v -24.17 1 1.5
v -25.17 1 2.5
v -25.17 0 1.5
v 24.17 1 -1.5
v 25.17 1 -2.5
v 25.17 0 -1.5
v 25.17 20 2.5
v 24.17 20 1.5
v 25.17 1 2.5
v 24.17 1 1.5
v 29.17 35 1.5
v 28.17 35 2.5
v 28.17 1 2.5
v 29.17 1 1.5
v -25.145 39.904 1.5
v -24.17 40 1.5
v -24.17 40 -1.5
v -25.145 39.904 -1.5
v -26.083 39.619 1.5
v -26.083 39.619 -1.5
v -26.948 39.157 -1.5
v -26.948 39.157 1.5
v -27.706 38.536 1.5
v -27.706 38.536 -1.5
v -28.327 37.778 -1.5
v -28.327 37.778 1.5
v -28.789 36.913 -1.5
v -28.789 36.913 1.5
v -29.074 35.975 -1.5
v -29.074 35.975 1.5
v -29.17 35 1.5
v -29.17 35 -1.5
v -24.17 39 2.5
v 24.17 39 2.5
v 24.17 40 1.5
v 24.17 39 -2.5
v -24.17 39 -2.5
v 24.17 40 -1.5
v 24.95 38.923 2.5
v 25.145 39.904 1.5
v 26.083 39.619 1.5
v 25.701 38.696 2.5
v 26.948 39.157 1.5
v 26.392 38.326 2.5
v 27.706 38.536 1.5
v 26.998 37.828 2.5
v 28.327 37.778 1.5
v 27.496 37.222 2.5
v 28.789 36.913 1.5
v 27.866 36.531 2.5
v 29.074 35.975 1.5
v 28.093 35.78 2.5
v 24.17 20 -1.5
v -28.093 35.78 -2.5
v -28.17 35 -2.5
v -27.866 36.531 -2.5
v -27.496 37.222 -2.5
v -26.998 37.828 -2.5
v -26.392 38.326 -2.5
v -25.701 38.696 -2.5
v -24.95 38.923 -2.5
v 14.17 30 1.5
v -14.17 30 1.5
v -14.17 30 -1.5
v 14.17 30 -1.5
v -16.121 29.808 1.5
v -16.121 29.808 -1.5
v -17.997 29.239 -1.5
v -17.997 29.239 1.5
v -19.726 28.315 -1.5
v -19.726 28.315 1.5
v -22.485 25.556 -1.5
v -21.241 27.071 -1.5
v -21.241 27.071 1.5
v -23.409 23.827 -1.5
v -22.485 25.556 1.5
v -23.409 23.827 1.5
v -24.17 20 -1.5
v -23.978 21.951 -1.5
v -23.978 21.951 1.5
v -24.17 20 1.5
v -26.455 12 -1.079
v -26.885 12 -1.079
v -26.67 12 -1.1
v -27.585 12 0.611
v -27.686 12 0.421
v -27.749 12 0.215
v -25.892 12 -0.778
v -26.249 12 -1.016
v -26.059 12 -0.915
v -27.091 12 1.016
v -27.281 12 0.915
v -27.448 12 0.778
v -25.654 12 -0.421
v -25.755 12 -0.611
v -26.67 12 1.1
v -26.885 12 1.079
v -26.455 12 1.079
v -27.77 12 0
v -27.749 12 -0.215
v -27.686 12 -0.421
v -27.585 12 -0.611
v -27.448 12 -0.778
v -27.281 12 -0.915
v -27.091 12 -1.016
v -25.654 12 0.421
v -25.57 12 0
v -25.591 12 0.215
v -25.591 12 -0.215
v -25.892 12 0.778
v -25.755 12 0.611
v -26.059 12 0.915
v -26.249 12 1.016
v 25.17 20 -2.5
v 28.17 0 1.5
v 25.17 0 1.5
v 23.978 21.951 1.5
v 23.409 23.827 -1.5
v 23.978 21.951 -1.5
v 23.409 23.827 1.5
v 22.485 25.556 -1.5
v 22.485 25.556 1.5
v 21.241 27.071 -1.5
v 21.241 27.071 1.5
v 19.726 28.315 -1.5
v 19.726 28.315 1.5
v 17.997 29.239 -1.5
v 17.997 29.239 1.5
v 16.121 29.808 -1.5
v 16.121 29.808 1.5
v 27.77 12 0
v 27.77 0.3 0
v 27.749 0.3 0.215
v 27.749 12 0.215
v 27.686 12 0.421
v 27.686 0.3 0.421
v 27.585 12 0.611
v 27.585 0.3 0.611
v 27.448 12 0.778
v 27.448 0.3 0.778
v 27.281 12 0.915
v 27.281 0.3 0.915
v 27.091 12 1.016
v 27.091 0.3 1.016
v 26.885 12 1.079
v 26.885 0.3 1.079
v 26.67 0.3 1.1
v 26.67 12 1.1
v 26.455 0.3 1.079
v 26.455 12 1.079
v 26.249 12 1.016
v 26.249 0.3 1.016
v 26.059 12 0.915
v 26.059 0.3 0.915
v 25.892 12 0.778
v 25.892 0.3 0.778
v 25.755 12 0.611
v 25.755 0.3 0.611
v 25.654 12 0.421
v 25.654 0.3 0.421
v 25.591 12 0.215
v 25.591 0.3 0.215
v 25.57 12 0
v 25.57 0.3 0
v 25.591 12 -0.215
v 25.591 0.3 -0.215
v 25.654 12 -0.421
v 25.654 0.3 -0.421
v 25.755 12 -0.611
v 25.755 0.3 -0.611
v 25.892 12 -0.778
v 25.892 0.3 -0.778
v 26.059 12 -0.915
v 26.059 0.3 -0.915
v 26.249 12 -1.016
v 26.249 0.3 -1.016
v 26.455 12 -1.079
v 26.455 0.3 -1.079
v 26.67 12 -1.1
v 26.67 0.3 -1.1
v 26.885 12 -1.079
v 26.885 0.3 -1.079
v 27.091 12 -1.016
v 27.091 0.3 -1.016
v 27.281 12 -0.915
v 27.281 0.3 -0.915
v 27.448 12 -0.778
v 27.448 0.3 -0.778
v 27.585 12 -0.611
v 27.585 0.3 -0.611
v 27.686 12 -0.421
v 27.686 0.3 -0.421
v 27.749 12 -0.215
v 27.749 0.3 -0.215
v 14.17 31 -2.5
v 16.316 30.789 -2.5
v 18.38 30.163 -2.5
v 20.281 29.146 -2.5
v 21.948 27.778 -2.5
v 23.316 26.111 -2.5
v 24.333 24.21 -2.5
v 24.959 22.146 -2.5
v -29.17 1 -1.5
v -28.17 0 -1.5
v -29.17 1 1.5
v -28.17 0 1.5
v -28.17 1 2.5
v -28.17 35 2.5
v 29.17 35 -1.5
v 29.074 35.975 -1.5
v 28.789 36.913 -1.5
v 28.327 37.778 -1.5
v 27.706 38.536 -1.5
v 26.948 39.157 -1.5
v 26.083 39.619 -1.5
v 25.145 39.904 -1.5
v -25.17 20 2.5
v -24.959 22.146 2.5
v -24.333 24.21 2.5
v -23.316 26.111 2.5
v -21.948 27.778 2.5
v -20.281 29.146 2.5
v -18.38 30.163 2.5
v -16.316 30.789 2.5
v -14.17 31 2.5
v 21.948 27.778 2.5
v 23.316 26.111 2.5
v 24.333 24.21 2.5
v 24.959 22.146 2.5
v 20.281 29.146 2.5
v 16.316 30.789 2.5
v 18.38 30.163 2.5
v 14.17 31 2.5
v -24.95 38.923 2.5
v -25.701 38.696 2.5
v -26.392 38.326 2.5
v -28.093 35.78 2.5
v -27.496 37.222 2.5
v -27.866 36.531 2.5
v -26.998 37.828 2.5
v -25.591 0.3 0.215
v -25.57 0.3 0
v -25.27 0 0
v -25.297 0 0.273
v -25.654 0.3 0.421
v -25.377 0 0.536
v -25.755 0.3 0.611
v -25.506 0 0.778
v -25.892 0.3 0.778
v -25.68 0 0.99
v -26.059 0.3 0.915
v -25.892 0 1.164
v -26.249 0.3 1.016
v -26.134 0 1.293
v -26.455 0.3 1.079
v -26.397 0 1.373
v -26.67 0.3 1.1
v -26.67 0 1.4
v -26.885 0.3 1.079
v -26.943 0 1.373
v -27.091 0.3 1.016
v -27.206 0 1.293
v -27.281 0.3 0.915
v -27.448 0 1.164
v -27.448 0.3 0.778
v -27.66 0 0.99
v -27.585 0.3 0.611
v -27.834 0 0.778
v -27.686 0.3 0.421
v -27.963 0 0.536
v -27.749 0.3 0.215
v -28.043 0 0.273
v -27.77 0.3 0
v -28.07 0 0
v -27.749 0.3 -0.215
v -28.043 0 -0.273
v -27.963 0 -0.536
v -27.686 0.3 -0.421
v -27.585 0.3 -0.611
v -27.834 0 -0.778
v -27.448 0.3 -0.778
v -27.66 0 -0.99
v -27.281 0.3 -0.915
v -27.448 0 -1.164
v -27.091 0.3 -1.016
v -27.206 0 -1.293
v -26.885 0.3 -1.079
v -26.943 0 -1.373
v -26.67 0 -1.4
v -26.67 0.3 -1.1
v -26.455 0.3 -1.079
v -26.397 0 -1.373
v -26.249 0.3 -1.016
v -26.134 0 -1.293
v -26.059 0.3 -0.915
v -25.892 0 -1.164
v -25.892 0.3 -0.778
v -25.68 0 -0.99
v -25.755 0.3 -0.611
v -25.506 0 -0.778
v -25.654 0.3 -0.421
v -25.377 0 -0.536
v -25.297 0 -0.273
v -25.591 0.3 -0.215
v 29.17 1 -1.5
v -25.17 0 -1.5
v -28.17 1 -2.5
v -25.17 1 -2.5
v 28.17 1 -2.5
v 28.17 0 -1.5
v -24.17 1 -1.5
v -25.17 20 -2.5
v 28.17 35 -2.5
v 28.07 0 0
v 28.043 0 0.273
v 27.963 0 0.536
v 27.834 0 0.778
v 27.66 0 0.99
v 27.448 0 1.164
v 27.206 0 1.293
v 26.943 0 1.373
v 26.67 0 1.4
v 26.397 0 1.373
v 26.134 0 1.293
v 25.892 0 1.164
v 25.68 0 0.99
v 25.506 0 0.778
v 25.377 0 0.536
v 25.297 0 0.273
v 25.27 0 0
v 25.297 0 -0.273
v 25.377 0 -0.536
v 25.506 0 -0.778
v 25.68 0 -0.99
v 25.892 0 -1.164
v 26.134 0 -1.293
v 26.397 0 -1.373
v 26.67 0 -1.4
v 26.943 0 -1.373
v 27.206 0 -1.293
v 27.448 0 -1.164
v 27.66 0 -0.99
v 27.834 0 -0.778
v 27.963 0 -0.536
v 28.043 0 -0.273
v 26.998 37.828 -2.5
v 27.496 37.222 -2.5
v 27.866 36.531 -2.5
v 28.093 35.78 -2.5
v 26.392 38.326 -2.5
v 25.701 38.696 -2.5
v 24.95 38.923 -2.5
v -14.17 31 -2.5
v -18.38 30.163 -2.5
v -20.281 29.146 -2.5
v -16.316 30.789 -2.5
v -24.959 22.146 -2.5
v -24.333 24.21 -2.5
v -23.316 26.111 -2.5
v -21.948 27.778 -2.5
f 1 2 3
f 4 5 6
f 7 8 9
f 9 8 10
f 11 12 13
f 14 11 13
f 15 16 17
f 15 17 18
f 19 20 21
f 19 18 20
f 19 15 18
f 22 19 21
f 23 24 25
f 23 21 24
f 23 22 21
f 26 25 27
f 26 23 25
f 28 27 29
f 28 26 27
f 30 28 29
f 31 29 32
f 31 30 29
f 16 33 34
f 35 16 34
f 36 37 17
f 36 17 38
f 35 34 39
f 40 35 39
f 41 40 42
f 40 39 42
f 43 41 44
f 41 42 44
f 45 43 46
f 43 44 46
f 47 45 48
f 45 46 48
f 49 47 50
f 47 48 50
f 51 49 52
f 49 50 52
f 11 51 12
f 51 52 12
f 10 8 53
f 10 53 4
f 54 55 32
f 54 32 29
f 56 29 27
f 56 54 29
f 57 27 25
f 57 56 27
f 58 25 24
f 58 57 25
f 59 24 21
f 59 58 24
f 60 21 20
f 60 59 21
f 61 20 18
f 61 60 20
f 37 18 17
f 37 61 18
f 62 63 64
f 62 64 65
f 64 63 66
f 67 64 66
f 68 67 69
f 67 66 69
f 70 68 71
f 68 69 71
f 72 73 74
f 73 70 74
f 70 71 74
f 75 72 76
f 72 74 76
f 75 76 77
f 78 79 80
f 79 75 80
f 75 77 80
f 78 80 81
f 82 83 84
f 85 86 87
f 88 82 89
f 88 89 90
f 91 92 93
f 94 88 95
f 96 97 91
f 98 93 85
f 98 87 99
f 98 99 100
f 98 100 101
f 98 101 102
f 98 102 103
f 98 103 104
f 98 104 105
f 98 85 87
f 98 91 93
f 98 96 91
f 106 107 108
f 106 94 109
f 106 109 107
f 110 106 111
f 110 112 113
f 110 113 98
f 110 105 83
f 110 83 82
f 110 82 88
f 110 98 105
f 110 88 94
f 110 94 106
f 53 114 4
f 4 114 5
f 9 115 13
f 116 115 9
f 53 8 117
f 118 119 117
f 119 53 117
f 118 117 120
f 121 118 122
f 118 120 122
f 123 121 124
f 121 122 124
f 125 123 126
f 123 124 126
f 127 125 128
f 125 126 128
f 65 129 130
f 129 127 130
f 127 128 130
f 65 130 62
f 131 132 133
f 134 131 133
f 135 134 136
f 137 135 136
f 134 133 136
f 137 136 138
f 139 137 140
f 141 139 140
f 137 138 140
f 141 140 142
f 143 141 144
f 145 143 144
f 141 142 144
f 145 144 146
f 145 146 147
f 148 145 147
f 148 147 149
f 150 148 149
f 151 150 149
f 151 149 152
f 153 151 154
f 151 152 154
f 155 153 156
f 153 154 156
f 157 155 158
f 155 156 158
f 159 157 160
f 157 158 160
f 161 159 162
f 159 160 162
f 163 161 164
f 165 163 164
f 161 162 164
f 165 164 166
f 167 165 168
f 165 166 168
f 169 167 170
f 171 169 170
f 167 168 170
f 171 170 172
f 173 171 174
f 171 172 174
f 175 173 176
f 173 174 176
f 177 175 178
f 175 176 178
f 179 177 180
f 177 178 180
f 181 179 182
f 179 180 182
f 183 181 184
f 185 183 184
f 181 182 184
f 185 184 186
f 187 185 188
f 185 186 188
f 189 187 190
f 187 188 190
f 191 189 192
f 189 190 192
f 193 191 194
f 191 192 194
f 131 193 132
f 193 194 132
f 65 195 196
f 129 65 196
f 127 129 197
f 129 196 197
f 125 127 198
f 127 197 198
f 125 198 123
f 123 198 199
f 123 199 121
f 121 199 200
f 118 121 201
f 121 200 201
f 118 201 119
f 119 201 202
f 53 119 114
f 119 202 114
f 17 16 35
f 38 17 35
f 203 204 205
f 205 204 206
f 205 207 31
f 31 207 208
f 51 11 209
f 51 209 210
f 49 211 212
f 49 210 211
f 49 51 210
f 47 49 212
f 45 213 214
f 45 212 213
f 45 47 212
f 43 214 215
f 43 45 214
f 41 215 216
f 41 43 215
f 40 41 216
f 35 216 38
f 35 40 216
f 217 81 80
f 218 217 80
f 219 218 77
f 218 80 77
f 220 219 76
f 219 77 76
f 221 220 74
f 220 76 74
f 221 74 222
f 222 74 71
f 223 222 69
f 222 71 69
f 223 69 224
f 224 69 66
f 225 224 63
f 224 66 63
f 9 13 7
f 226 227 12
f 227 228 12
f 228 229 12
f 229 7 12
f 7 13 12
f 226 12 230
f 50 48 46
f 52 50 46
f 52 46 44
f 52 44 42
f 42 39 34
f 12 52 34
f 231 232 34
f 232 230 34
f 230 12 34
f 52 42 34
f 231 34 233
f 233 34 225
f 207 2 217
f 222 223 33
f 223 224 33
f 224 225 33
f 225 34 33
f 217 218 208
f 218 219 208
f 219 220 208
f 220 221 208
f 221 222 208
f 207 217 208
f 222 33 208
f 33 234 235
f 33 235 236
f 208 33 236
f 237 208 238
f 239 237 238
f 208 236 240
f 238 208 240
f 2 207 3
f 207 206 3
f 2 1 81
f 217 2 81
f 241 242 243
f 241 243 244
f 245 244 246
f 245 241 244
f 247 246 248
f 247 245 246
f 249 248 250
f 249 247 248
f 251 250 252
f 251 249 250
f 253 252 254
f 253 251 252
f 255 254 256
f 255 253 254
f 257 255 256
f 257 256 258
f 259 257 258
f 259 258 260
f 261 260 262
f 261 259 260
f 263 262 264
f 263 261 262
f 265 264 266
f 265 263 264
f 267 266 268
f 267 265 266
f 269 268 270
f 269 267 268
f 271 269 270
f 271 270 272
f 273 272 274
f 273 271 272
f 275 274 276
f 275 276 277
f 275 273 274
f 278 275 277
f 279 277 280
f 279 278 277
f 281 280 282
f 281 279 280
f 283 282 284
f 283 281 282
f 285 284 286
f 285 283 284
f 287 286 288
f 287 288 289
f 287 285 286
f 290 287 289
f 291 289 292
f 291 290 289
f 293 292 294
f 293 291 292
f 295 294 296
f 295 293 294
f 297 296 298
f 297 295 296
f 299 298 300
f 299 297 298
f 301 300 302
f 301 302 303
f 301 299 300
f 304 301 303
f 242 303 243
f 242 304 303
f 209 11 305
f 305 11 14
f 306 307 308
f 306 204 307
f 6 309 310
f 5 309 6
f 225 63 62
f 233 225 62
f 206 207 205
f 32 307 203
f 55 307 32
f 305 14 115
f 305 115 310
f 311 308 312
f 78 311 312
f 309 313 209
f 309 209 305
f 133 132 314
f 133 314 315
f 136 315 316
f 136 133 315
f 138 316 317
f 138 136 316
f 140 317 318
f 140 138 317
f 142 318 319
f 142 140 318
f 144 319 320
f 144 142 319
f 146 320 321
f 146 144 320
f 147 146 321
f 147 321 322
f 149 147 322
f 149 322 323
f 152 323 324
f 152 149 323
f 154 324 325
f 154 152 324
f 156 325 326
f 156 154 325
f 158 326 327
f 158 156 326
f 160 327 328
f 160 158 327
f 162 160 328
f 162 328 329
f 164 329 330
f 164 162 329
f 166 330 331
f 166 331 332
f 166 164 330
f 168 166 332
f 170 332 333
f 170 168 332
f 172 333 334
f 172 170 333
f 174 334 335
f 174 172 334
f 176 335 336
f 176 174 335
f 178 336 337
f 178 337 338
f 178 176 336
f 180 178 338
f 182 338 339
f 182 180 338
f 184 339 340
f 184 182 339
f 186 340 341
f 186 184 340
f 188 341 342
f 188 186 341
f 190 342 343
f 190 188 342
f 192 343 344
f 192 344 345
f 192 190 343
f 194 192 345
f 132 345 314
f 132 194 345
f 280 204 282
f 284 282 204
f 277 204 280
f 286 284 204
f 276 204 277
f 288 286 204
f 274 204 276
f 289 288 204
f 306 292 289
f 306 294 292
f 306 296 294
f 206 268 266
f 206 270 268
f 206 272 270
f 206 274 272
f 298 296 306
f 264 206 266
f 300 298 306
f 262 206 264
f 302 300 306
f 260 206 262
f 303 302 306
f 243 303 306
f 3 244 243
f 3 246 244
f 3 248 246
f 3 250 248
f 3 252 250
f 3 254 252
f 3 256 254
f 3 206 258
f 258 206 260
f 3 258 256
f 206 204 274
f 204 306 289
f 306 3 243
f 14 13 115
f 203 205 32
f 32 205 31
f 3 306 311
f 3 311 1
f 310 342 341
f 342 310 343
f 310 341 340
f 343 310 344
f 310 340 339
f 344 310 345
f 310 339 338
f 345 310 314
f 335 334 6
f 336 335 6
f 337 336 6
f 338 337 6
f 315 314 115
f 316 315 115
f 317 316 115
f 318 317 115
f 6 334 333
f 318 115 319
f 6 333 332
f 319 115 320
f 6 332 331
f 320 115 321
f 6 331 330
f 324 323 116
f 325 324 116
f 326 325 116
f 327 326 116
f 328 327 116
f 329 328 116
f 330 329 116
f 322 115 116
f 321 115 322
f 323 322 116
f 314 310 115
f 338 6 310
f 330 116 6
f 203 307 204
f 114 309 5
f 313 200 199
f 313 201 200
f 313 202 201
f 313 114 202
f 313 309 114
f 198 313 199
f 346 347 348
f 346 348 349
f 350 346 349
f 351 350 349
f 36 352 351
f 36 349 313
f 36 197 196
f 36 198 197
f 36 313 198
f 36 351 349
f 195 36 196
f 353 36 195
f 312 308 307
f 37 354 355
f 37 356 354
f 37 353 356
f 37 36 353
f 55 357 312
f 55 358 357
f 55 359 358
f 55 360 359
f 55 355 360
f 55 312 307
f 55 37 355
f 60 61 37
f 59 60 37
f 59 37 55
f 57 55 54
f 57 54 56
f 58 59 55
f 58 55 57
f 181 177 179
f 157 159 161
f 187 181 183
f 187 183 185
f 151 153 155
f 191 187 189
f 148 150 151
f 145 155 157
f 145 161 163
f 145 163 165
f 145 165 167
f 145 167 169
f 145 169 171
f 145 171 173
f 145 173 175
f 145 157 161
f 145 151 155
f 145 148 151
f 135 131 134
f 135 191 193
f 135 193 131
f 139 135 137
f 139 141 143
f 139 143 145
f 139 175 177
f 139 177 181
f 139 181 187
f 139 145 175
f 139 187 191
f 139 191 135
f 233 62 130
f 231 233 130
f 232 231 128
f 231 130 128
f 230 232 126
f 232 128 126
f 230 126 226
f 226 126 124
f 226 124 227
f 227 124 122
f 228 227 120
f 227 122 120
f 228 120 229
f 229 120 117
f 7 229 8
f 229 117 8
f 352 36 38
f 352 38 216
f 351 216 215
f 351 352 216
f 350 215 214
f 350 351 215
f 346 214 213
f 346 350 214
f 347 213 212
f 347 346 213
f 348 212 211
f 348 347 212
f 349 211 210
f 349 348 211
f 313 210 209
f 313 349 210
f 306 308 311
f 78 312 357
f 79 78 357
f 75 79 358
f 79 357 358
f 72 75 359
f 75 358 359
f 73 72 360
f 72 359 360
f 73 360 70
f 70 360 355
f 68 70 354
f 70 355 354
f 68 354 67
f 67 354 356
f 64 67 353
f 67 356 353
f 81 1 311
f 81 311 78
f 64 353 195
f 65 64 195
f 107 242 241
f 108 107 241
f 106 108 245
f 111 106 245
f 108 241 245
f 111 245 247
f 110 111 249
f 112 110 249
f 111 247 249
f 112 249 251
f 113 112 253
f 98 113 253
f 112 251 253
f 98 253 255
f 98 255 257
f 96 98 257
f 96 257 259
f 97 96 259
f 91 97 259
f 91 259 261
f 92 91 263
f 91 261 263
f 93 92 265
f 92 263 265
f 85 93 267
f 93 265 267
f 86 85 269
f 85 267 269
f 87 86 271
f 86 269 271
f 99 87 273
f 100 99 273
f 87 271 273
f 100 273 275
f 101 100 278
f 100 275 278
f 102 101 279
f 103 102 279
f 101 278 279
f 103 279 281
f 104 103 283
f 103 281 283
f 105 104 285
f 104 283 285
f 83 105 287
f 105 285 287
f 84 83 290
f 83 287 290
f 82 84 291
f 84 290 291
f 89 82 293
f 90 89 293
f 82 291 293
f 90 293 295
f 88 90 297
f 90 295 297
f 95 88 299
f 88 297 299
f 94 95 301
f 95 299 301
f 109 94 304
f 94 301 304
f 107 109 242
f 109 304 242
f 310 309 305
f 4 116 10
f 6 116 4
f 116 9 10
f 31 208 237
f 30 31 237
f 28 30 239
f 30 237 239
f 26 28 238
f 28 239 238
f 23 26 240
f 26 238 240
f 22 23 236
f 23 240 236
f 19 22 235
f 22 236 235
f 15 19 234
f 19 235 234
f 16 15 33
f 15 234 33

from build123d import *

# Parameters (mm, degrees)
PAD_DEPTH       = 2.5
CHAMFER_SIZE    = 1
SKETCH001_R     = 1.1
POCKET_DEPTH    = 12
CHAMFER001_SIZE = 0.3


with BuildPart() as part:
    # Sketch → Pad (new body, symmetric)
    with BuildSketch(Plane.XY):
        with BuildLine():
            Line((-29.17, 0), (-29.17, 35))
            ThreePointArc((-24.17, 40), (-27.705534, 38.535534), (-29.17, 35))
            Line((-24.17, 40), (24.17, 40))
            ThreePointArc((29.17, 35), (27.705534, 38.535534), (24.17, 40))
            Line((29.17, 35), (29.17, 0))
            Line((29.17, 0), (24.17, 0))
            Line((24.17, 20), (24.17, 0))
            ThreePointArc((24.17, 20), (21.241068, 27.071068), (14.17, 30))
            Line((-14.17, 30), (14.17, 30))
            ThreePointArc((-14.17, 30), (-21.241068, 27.071068), (-24.17, 20))
            Line((-24.17, 0), (-24.17, 20))
            Line((-29.17, 0), (-24.17, 0))
        make_face()
    extrude(amount=PAD_DEPTH, both=True)

    # Chamfer
    chamfer_edges = [part.edges().sort_by_distance(p)[0] for p in [
        (-26.67, 0, 2.5),
        (-29.17, 17.5, 2.5),
        (-27.705534, 38.535534, 2.5),
        (0, 40, 2.5),
        (27.705534, 38.535534, 2.5),
        (29.17, 17.5, 2.5),
        (26.67, 0, 2.5),
        (24.17, 10, 2.5),
        (21.241068, 27.071068, 2.5),
        (0, 30, 2.5),
        (-21.241068, 27.071068, 2.5),
        (-24.17, 10, 2.5),
        (-26.67, 0, -2.5),
        (-29.17, 17.5, -2.5),
        (-27.705534, 38.535534, -2.5),
        (0, 40, -2.5),
        (27.705534, 38.535534, -2.5),
        (29.17, 17.5, -2.5),
        (26.67, 0, -2.5),
        (24.17, 10, -2.5),
        (21.241068, 27.071068, -2.5),
        (0, 30, -2.5),
        (-21.241068, 27.071068, -2.5),
        (-24.17, 10, -2.5),
        (-29.17, 0, 0),
        (-24.17, 0, 0),
        (24.17, 0, 0),
        (29.17, 0, 0),
    ]]
    chamfer(chamfer_edges, length=CHAMFER_SIZE)

    # Sketch001 → Pocket (cut)
    with BuildSketch(Plane.XZ):
        with Locations((-26.67, 0)):
            Circle(SKETCH001_R)
        with Locations((26.67, 0)):
            Circle(SKETCH001_R)
    extrude(amount=-POCKET_DEPTH, mode=Mode.SUBTRACT)

    # Chamfer001
    chamfer001_edges = [part.edges().sort_by_distance(p)[0] for p in [
        (-27.77, 0, 0),
        (25.57, 0, 0),
    ]]
    chamfer(chamfer001_edges, length=CHAMFER001_SIZE)


solid = part.part
